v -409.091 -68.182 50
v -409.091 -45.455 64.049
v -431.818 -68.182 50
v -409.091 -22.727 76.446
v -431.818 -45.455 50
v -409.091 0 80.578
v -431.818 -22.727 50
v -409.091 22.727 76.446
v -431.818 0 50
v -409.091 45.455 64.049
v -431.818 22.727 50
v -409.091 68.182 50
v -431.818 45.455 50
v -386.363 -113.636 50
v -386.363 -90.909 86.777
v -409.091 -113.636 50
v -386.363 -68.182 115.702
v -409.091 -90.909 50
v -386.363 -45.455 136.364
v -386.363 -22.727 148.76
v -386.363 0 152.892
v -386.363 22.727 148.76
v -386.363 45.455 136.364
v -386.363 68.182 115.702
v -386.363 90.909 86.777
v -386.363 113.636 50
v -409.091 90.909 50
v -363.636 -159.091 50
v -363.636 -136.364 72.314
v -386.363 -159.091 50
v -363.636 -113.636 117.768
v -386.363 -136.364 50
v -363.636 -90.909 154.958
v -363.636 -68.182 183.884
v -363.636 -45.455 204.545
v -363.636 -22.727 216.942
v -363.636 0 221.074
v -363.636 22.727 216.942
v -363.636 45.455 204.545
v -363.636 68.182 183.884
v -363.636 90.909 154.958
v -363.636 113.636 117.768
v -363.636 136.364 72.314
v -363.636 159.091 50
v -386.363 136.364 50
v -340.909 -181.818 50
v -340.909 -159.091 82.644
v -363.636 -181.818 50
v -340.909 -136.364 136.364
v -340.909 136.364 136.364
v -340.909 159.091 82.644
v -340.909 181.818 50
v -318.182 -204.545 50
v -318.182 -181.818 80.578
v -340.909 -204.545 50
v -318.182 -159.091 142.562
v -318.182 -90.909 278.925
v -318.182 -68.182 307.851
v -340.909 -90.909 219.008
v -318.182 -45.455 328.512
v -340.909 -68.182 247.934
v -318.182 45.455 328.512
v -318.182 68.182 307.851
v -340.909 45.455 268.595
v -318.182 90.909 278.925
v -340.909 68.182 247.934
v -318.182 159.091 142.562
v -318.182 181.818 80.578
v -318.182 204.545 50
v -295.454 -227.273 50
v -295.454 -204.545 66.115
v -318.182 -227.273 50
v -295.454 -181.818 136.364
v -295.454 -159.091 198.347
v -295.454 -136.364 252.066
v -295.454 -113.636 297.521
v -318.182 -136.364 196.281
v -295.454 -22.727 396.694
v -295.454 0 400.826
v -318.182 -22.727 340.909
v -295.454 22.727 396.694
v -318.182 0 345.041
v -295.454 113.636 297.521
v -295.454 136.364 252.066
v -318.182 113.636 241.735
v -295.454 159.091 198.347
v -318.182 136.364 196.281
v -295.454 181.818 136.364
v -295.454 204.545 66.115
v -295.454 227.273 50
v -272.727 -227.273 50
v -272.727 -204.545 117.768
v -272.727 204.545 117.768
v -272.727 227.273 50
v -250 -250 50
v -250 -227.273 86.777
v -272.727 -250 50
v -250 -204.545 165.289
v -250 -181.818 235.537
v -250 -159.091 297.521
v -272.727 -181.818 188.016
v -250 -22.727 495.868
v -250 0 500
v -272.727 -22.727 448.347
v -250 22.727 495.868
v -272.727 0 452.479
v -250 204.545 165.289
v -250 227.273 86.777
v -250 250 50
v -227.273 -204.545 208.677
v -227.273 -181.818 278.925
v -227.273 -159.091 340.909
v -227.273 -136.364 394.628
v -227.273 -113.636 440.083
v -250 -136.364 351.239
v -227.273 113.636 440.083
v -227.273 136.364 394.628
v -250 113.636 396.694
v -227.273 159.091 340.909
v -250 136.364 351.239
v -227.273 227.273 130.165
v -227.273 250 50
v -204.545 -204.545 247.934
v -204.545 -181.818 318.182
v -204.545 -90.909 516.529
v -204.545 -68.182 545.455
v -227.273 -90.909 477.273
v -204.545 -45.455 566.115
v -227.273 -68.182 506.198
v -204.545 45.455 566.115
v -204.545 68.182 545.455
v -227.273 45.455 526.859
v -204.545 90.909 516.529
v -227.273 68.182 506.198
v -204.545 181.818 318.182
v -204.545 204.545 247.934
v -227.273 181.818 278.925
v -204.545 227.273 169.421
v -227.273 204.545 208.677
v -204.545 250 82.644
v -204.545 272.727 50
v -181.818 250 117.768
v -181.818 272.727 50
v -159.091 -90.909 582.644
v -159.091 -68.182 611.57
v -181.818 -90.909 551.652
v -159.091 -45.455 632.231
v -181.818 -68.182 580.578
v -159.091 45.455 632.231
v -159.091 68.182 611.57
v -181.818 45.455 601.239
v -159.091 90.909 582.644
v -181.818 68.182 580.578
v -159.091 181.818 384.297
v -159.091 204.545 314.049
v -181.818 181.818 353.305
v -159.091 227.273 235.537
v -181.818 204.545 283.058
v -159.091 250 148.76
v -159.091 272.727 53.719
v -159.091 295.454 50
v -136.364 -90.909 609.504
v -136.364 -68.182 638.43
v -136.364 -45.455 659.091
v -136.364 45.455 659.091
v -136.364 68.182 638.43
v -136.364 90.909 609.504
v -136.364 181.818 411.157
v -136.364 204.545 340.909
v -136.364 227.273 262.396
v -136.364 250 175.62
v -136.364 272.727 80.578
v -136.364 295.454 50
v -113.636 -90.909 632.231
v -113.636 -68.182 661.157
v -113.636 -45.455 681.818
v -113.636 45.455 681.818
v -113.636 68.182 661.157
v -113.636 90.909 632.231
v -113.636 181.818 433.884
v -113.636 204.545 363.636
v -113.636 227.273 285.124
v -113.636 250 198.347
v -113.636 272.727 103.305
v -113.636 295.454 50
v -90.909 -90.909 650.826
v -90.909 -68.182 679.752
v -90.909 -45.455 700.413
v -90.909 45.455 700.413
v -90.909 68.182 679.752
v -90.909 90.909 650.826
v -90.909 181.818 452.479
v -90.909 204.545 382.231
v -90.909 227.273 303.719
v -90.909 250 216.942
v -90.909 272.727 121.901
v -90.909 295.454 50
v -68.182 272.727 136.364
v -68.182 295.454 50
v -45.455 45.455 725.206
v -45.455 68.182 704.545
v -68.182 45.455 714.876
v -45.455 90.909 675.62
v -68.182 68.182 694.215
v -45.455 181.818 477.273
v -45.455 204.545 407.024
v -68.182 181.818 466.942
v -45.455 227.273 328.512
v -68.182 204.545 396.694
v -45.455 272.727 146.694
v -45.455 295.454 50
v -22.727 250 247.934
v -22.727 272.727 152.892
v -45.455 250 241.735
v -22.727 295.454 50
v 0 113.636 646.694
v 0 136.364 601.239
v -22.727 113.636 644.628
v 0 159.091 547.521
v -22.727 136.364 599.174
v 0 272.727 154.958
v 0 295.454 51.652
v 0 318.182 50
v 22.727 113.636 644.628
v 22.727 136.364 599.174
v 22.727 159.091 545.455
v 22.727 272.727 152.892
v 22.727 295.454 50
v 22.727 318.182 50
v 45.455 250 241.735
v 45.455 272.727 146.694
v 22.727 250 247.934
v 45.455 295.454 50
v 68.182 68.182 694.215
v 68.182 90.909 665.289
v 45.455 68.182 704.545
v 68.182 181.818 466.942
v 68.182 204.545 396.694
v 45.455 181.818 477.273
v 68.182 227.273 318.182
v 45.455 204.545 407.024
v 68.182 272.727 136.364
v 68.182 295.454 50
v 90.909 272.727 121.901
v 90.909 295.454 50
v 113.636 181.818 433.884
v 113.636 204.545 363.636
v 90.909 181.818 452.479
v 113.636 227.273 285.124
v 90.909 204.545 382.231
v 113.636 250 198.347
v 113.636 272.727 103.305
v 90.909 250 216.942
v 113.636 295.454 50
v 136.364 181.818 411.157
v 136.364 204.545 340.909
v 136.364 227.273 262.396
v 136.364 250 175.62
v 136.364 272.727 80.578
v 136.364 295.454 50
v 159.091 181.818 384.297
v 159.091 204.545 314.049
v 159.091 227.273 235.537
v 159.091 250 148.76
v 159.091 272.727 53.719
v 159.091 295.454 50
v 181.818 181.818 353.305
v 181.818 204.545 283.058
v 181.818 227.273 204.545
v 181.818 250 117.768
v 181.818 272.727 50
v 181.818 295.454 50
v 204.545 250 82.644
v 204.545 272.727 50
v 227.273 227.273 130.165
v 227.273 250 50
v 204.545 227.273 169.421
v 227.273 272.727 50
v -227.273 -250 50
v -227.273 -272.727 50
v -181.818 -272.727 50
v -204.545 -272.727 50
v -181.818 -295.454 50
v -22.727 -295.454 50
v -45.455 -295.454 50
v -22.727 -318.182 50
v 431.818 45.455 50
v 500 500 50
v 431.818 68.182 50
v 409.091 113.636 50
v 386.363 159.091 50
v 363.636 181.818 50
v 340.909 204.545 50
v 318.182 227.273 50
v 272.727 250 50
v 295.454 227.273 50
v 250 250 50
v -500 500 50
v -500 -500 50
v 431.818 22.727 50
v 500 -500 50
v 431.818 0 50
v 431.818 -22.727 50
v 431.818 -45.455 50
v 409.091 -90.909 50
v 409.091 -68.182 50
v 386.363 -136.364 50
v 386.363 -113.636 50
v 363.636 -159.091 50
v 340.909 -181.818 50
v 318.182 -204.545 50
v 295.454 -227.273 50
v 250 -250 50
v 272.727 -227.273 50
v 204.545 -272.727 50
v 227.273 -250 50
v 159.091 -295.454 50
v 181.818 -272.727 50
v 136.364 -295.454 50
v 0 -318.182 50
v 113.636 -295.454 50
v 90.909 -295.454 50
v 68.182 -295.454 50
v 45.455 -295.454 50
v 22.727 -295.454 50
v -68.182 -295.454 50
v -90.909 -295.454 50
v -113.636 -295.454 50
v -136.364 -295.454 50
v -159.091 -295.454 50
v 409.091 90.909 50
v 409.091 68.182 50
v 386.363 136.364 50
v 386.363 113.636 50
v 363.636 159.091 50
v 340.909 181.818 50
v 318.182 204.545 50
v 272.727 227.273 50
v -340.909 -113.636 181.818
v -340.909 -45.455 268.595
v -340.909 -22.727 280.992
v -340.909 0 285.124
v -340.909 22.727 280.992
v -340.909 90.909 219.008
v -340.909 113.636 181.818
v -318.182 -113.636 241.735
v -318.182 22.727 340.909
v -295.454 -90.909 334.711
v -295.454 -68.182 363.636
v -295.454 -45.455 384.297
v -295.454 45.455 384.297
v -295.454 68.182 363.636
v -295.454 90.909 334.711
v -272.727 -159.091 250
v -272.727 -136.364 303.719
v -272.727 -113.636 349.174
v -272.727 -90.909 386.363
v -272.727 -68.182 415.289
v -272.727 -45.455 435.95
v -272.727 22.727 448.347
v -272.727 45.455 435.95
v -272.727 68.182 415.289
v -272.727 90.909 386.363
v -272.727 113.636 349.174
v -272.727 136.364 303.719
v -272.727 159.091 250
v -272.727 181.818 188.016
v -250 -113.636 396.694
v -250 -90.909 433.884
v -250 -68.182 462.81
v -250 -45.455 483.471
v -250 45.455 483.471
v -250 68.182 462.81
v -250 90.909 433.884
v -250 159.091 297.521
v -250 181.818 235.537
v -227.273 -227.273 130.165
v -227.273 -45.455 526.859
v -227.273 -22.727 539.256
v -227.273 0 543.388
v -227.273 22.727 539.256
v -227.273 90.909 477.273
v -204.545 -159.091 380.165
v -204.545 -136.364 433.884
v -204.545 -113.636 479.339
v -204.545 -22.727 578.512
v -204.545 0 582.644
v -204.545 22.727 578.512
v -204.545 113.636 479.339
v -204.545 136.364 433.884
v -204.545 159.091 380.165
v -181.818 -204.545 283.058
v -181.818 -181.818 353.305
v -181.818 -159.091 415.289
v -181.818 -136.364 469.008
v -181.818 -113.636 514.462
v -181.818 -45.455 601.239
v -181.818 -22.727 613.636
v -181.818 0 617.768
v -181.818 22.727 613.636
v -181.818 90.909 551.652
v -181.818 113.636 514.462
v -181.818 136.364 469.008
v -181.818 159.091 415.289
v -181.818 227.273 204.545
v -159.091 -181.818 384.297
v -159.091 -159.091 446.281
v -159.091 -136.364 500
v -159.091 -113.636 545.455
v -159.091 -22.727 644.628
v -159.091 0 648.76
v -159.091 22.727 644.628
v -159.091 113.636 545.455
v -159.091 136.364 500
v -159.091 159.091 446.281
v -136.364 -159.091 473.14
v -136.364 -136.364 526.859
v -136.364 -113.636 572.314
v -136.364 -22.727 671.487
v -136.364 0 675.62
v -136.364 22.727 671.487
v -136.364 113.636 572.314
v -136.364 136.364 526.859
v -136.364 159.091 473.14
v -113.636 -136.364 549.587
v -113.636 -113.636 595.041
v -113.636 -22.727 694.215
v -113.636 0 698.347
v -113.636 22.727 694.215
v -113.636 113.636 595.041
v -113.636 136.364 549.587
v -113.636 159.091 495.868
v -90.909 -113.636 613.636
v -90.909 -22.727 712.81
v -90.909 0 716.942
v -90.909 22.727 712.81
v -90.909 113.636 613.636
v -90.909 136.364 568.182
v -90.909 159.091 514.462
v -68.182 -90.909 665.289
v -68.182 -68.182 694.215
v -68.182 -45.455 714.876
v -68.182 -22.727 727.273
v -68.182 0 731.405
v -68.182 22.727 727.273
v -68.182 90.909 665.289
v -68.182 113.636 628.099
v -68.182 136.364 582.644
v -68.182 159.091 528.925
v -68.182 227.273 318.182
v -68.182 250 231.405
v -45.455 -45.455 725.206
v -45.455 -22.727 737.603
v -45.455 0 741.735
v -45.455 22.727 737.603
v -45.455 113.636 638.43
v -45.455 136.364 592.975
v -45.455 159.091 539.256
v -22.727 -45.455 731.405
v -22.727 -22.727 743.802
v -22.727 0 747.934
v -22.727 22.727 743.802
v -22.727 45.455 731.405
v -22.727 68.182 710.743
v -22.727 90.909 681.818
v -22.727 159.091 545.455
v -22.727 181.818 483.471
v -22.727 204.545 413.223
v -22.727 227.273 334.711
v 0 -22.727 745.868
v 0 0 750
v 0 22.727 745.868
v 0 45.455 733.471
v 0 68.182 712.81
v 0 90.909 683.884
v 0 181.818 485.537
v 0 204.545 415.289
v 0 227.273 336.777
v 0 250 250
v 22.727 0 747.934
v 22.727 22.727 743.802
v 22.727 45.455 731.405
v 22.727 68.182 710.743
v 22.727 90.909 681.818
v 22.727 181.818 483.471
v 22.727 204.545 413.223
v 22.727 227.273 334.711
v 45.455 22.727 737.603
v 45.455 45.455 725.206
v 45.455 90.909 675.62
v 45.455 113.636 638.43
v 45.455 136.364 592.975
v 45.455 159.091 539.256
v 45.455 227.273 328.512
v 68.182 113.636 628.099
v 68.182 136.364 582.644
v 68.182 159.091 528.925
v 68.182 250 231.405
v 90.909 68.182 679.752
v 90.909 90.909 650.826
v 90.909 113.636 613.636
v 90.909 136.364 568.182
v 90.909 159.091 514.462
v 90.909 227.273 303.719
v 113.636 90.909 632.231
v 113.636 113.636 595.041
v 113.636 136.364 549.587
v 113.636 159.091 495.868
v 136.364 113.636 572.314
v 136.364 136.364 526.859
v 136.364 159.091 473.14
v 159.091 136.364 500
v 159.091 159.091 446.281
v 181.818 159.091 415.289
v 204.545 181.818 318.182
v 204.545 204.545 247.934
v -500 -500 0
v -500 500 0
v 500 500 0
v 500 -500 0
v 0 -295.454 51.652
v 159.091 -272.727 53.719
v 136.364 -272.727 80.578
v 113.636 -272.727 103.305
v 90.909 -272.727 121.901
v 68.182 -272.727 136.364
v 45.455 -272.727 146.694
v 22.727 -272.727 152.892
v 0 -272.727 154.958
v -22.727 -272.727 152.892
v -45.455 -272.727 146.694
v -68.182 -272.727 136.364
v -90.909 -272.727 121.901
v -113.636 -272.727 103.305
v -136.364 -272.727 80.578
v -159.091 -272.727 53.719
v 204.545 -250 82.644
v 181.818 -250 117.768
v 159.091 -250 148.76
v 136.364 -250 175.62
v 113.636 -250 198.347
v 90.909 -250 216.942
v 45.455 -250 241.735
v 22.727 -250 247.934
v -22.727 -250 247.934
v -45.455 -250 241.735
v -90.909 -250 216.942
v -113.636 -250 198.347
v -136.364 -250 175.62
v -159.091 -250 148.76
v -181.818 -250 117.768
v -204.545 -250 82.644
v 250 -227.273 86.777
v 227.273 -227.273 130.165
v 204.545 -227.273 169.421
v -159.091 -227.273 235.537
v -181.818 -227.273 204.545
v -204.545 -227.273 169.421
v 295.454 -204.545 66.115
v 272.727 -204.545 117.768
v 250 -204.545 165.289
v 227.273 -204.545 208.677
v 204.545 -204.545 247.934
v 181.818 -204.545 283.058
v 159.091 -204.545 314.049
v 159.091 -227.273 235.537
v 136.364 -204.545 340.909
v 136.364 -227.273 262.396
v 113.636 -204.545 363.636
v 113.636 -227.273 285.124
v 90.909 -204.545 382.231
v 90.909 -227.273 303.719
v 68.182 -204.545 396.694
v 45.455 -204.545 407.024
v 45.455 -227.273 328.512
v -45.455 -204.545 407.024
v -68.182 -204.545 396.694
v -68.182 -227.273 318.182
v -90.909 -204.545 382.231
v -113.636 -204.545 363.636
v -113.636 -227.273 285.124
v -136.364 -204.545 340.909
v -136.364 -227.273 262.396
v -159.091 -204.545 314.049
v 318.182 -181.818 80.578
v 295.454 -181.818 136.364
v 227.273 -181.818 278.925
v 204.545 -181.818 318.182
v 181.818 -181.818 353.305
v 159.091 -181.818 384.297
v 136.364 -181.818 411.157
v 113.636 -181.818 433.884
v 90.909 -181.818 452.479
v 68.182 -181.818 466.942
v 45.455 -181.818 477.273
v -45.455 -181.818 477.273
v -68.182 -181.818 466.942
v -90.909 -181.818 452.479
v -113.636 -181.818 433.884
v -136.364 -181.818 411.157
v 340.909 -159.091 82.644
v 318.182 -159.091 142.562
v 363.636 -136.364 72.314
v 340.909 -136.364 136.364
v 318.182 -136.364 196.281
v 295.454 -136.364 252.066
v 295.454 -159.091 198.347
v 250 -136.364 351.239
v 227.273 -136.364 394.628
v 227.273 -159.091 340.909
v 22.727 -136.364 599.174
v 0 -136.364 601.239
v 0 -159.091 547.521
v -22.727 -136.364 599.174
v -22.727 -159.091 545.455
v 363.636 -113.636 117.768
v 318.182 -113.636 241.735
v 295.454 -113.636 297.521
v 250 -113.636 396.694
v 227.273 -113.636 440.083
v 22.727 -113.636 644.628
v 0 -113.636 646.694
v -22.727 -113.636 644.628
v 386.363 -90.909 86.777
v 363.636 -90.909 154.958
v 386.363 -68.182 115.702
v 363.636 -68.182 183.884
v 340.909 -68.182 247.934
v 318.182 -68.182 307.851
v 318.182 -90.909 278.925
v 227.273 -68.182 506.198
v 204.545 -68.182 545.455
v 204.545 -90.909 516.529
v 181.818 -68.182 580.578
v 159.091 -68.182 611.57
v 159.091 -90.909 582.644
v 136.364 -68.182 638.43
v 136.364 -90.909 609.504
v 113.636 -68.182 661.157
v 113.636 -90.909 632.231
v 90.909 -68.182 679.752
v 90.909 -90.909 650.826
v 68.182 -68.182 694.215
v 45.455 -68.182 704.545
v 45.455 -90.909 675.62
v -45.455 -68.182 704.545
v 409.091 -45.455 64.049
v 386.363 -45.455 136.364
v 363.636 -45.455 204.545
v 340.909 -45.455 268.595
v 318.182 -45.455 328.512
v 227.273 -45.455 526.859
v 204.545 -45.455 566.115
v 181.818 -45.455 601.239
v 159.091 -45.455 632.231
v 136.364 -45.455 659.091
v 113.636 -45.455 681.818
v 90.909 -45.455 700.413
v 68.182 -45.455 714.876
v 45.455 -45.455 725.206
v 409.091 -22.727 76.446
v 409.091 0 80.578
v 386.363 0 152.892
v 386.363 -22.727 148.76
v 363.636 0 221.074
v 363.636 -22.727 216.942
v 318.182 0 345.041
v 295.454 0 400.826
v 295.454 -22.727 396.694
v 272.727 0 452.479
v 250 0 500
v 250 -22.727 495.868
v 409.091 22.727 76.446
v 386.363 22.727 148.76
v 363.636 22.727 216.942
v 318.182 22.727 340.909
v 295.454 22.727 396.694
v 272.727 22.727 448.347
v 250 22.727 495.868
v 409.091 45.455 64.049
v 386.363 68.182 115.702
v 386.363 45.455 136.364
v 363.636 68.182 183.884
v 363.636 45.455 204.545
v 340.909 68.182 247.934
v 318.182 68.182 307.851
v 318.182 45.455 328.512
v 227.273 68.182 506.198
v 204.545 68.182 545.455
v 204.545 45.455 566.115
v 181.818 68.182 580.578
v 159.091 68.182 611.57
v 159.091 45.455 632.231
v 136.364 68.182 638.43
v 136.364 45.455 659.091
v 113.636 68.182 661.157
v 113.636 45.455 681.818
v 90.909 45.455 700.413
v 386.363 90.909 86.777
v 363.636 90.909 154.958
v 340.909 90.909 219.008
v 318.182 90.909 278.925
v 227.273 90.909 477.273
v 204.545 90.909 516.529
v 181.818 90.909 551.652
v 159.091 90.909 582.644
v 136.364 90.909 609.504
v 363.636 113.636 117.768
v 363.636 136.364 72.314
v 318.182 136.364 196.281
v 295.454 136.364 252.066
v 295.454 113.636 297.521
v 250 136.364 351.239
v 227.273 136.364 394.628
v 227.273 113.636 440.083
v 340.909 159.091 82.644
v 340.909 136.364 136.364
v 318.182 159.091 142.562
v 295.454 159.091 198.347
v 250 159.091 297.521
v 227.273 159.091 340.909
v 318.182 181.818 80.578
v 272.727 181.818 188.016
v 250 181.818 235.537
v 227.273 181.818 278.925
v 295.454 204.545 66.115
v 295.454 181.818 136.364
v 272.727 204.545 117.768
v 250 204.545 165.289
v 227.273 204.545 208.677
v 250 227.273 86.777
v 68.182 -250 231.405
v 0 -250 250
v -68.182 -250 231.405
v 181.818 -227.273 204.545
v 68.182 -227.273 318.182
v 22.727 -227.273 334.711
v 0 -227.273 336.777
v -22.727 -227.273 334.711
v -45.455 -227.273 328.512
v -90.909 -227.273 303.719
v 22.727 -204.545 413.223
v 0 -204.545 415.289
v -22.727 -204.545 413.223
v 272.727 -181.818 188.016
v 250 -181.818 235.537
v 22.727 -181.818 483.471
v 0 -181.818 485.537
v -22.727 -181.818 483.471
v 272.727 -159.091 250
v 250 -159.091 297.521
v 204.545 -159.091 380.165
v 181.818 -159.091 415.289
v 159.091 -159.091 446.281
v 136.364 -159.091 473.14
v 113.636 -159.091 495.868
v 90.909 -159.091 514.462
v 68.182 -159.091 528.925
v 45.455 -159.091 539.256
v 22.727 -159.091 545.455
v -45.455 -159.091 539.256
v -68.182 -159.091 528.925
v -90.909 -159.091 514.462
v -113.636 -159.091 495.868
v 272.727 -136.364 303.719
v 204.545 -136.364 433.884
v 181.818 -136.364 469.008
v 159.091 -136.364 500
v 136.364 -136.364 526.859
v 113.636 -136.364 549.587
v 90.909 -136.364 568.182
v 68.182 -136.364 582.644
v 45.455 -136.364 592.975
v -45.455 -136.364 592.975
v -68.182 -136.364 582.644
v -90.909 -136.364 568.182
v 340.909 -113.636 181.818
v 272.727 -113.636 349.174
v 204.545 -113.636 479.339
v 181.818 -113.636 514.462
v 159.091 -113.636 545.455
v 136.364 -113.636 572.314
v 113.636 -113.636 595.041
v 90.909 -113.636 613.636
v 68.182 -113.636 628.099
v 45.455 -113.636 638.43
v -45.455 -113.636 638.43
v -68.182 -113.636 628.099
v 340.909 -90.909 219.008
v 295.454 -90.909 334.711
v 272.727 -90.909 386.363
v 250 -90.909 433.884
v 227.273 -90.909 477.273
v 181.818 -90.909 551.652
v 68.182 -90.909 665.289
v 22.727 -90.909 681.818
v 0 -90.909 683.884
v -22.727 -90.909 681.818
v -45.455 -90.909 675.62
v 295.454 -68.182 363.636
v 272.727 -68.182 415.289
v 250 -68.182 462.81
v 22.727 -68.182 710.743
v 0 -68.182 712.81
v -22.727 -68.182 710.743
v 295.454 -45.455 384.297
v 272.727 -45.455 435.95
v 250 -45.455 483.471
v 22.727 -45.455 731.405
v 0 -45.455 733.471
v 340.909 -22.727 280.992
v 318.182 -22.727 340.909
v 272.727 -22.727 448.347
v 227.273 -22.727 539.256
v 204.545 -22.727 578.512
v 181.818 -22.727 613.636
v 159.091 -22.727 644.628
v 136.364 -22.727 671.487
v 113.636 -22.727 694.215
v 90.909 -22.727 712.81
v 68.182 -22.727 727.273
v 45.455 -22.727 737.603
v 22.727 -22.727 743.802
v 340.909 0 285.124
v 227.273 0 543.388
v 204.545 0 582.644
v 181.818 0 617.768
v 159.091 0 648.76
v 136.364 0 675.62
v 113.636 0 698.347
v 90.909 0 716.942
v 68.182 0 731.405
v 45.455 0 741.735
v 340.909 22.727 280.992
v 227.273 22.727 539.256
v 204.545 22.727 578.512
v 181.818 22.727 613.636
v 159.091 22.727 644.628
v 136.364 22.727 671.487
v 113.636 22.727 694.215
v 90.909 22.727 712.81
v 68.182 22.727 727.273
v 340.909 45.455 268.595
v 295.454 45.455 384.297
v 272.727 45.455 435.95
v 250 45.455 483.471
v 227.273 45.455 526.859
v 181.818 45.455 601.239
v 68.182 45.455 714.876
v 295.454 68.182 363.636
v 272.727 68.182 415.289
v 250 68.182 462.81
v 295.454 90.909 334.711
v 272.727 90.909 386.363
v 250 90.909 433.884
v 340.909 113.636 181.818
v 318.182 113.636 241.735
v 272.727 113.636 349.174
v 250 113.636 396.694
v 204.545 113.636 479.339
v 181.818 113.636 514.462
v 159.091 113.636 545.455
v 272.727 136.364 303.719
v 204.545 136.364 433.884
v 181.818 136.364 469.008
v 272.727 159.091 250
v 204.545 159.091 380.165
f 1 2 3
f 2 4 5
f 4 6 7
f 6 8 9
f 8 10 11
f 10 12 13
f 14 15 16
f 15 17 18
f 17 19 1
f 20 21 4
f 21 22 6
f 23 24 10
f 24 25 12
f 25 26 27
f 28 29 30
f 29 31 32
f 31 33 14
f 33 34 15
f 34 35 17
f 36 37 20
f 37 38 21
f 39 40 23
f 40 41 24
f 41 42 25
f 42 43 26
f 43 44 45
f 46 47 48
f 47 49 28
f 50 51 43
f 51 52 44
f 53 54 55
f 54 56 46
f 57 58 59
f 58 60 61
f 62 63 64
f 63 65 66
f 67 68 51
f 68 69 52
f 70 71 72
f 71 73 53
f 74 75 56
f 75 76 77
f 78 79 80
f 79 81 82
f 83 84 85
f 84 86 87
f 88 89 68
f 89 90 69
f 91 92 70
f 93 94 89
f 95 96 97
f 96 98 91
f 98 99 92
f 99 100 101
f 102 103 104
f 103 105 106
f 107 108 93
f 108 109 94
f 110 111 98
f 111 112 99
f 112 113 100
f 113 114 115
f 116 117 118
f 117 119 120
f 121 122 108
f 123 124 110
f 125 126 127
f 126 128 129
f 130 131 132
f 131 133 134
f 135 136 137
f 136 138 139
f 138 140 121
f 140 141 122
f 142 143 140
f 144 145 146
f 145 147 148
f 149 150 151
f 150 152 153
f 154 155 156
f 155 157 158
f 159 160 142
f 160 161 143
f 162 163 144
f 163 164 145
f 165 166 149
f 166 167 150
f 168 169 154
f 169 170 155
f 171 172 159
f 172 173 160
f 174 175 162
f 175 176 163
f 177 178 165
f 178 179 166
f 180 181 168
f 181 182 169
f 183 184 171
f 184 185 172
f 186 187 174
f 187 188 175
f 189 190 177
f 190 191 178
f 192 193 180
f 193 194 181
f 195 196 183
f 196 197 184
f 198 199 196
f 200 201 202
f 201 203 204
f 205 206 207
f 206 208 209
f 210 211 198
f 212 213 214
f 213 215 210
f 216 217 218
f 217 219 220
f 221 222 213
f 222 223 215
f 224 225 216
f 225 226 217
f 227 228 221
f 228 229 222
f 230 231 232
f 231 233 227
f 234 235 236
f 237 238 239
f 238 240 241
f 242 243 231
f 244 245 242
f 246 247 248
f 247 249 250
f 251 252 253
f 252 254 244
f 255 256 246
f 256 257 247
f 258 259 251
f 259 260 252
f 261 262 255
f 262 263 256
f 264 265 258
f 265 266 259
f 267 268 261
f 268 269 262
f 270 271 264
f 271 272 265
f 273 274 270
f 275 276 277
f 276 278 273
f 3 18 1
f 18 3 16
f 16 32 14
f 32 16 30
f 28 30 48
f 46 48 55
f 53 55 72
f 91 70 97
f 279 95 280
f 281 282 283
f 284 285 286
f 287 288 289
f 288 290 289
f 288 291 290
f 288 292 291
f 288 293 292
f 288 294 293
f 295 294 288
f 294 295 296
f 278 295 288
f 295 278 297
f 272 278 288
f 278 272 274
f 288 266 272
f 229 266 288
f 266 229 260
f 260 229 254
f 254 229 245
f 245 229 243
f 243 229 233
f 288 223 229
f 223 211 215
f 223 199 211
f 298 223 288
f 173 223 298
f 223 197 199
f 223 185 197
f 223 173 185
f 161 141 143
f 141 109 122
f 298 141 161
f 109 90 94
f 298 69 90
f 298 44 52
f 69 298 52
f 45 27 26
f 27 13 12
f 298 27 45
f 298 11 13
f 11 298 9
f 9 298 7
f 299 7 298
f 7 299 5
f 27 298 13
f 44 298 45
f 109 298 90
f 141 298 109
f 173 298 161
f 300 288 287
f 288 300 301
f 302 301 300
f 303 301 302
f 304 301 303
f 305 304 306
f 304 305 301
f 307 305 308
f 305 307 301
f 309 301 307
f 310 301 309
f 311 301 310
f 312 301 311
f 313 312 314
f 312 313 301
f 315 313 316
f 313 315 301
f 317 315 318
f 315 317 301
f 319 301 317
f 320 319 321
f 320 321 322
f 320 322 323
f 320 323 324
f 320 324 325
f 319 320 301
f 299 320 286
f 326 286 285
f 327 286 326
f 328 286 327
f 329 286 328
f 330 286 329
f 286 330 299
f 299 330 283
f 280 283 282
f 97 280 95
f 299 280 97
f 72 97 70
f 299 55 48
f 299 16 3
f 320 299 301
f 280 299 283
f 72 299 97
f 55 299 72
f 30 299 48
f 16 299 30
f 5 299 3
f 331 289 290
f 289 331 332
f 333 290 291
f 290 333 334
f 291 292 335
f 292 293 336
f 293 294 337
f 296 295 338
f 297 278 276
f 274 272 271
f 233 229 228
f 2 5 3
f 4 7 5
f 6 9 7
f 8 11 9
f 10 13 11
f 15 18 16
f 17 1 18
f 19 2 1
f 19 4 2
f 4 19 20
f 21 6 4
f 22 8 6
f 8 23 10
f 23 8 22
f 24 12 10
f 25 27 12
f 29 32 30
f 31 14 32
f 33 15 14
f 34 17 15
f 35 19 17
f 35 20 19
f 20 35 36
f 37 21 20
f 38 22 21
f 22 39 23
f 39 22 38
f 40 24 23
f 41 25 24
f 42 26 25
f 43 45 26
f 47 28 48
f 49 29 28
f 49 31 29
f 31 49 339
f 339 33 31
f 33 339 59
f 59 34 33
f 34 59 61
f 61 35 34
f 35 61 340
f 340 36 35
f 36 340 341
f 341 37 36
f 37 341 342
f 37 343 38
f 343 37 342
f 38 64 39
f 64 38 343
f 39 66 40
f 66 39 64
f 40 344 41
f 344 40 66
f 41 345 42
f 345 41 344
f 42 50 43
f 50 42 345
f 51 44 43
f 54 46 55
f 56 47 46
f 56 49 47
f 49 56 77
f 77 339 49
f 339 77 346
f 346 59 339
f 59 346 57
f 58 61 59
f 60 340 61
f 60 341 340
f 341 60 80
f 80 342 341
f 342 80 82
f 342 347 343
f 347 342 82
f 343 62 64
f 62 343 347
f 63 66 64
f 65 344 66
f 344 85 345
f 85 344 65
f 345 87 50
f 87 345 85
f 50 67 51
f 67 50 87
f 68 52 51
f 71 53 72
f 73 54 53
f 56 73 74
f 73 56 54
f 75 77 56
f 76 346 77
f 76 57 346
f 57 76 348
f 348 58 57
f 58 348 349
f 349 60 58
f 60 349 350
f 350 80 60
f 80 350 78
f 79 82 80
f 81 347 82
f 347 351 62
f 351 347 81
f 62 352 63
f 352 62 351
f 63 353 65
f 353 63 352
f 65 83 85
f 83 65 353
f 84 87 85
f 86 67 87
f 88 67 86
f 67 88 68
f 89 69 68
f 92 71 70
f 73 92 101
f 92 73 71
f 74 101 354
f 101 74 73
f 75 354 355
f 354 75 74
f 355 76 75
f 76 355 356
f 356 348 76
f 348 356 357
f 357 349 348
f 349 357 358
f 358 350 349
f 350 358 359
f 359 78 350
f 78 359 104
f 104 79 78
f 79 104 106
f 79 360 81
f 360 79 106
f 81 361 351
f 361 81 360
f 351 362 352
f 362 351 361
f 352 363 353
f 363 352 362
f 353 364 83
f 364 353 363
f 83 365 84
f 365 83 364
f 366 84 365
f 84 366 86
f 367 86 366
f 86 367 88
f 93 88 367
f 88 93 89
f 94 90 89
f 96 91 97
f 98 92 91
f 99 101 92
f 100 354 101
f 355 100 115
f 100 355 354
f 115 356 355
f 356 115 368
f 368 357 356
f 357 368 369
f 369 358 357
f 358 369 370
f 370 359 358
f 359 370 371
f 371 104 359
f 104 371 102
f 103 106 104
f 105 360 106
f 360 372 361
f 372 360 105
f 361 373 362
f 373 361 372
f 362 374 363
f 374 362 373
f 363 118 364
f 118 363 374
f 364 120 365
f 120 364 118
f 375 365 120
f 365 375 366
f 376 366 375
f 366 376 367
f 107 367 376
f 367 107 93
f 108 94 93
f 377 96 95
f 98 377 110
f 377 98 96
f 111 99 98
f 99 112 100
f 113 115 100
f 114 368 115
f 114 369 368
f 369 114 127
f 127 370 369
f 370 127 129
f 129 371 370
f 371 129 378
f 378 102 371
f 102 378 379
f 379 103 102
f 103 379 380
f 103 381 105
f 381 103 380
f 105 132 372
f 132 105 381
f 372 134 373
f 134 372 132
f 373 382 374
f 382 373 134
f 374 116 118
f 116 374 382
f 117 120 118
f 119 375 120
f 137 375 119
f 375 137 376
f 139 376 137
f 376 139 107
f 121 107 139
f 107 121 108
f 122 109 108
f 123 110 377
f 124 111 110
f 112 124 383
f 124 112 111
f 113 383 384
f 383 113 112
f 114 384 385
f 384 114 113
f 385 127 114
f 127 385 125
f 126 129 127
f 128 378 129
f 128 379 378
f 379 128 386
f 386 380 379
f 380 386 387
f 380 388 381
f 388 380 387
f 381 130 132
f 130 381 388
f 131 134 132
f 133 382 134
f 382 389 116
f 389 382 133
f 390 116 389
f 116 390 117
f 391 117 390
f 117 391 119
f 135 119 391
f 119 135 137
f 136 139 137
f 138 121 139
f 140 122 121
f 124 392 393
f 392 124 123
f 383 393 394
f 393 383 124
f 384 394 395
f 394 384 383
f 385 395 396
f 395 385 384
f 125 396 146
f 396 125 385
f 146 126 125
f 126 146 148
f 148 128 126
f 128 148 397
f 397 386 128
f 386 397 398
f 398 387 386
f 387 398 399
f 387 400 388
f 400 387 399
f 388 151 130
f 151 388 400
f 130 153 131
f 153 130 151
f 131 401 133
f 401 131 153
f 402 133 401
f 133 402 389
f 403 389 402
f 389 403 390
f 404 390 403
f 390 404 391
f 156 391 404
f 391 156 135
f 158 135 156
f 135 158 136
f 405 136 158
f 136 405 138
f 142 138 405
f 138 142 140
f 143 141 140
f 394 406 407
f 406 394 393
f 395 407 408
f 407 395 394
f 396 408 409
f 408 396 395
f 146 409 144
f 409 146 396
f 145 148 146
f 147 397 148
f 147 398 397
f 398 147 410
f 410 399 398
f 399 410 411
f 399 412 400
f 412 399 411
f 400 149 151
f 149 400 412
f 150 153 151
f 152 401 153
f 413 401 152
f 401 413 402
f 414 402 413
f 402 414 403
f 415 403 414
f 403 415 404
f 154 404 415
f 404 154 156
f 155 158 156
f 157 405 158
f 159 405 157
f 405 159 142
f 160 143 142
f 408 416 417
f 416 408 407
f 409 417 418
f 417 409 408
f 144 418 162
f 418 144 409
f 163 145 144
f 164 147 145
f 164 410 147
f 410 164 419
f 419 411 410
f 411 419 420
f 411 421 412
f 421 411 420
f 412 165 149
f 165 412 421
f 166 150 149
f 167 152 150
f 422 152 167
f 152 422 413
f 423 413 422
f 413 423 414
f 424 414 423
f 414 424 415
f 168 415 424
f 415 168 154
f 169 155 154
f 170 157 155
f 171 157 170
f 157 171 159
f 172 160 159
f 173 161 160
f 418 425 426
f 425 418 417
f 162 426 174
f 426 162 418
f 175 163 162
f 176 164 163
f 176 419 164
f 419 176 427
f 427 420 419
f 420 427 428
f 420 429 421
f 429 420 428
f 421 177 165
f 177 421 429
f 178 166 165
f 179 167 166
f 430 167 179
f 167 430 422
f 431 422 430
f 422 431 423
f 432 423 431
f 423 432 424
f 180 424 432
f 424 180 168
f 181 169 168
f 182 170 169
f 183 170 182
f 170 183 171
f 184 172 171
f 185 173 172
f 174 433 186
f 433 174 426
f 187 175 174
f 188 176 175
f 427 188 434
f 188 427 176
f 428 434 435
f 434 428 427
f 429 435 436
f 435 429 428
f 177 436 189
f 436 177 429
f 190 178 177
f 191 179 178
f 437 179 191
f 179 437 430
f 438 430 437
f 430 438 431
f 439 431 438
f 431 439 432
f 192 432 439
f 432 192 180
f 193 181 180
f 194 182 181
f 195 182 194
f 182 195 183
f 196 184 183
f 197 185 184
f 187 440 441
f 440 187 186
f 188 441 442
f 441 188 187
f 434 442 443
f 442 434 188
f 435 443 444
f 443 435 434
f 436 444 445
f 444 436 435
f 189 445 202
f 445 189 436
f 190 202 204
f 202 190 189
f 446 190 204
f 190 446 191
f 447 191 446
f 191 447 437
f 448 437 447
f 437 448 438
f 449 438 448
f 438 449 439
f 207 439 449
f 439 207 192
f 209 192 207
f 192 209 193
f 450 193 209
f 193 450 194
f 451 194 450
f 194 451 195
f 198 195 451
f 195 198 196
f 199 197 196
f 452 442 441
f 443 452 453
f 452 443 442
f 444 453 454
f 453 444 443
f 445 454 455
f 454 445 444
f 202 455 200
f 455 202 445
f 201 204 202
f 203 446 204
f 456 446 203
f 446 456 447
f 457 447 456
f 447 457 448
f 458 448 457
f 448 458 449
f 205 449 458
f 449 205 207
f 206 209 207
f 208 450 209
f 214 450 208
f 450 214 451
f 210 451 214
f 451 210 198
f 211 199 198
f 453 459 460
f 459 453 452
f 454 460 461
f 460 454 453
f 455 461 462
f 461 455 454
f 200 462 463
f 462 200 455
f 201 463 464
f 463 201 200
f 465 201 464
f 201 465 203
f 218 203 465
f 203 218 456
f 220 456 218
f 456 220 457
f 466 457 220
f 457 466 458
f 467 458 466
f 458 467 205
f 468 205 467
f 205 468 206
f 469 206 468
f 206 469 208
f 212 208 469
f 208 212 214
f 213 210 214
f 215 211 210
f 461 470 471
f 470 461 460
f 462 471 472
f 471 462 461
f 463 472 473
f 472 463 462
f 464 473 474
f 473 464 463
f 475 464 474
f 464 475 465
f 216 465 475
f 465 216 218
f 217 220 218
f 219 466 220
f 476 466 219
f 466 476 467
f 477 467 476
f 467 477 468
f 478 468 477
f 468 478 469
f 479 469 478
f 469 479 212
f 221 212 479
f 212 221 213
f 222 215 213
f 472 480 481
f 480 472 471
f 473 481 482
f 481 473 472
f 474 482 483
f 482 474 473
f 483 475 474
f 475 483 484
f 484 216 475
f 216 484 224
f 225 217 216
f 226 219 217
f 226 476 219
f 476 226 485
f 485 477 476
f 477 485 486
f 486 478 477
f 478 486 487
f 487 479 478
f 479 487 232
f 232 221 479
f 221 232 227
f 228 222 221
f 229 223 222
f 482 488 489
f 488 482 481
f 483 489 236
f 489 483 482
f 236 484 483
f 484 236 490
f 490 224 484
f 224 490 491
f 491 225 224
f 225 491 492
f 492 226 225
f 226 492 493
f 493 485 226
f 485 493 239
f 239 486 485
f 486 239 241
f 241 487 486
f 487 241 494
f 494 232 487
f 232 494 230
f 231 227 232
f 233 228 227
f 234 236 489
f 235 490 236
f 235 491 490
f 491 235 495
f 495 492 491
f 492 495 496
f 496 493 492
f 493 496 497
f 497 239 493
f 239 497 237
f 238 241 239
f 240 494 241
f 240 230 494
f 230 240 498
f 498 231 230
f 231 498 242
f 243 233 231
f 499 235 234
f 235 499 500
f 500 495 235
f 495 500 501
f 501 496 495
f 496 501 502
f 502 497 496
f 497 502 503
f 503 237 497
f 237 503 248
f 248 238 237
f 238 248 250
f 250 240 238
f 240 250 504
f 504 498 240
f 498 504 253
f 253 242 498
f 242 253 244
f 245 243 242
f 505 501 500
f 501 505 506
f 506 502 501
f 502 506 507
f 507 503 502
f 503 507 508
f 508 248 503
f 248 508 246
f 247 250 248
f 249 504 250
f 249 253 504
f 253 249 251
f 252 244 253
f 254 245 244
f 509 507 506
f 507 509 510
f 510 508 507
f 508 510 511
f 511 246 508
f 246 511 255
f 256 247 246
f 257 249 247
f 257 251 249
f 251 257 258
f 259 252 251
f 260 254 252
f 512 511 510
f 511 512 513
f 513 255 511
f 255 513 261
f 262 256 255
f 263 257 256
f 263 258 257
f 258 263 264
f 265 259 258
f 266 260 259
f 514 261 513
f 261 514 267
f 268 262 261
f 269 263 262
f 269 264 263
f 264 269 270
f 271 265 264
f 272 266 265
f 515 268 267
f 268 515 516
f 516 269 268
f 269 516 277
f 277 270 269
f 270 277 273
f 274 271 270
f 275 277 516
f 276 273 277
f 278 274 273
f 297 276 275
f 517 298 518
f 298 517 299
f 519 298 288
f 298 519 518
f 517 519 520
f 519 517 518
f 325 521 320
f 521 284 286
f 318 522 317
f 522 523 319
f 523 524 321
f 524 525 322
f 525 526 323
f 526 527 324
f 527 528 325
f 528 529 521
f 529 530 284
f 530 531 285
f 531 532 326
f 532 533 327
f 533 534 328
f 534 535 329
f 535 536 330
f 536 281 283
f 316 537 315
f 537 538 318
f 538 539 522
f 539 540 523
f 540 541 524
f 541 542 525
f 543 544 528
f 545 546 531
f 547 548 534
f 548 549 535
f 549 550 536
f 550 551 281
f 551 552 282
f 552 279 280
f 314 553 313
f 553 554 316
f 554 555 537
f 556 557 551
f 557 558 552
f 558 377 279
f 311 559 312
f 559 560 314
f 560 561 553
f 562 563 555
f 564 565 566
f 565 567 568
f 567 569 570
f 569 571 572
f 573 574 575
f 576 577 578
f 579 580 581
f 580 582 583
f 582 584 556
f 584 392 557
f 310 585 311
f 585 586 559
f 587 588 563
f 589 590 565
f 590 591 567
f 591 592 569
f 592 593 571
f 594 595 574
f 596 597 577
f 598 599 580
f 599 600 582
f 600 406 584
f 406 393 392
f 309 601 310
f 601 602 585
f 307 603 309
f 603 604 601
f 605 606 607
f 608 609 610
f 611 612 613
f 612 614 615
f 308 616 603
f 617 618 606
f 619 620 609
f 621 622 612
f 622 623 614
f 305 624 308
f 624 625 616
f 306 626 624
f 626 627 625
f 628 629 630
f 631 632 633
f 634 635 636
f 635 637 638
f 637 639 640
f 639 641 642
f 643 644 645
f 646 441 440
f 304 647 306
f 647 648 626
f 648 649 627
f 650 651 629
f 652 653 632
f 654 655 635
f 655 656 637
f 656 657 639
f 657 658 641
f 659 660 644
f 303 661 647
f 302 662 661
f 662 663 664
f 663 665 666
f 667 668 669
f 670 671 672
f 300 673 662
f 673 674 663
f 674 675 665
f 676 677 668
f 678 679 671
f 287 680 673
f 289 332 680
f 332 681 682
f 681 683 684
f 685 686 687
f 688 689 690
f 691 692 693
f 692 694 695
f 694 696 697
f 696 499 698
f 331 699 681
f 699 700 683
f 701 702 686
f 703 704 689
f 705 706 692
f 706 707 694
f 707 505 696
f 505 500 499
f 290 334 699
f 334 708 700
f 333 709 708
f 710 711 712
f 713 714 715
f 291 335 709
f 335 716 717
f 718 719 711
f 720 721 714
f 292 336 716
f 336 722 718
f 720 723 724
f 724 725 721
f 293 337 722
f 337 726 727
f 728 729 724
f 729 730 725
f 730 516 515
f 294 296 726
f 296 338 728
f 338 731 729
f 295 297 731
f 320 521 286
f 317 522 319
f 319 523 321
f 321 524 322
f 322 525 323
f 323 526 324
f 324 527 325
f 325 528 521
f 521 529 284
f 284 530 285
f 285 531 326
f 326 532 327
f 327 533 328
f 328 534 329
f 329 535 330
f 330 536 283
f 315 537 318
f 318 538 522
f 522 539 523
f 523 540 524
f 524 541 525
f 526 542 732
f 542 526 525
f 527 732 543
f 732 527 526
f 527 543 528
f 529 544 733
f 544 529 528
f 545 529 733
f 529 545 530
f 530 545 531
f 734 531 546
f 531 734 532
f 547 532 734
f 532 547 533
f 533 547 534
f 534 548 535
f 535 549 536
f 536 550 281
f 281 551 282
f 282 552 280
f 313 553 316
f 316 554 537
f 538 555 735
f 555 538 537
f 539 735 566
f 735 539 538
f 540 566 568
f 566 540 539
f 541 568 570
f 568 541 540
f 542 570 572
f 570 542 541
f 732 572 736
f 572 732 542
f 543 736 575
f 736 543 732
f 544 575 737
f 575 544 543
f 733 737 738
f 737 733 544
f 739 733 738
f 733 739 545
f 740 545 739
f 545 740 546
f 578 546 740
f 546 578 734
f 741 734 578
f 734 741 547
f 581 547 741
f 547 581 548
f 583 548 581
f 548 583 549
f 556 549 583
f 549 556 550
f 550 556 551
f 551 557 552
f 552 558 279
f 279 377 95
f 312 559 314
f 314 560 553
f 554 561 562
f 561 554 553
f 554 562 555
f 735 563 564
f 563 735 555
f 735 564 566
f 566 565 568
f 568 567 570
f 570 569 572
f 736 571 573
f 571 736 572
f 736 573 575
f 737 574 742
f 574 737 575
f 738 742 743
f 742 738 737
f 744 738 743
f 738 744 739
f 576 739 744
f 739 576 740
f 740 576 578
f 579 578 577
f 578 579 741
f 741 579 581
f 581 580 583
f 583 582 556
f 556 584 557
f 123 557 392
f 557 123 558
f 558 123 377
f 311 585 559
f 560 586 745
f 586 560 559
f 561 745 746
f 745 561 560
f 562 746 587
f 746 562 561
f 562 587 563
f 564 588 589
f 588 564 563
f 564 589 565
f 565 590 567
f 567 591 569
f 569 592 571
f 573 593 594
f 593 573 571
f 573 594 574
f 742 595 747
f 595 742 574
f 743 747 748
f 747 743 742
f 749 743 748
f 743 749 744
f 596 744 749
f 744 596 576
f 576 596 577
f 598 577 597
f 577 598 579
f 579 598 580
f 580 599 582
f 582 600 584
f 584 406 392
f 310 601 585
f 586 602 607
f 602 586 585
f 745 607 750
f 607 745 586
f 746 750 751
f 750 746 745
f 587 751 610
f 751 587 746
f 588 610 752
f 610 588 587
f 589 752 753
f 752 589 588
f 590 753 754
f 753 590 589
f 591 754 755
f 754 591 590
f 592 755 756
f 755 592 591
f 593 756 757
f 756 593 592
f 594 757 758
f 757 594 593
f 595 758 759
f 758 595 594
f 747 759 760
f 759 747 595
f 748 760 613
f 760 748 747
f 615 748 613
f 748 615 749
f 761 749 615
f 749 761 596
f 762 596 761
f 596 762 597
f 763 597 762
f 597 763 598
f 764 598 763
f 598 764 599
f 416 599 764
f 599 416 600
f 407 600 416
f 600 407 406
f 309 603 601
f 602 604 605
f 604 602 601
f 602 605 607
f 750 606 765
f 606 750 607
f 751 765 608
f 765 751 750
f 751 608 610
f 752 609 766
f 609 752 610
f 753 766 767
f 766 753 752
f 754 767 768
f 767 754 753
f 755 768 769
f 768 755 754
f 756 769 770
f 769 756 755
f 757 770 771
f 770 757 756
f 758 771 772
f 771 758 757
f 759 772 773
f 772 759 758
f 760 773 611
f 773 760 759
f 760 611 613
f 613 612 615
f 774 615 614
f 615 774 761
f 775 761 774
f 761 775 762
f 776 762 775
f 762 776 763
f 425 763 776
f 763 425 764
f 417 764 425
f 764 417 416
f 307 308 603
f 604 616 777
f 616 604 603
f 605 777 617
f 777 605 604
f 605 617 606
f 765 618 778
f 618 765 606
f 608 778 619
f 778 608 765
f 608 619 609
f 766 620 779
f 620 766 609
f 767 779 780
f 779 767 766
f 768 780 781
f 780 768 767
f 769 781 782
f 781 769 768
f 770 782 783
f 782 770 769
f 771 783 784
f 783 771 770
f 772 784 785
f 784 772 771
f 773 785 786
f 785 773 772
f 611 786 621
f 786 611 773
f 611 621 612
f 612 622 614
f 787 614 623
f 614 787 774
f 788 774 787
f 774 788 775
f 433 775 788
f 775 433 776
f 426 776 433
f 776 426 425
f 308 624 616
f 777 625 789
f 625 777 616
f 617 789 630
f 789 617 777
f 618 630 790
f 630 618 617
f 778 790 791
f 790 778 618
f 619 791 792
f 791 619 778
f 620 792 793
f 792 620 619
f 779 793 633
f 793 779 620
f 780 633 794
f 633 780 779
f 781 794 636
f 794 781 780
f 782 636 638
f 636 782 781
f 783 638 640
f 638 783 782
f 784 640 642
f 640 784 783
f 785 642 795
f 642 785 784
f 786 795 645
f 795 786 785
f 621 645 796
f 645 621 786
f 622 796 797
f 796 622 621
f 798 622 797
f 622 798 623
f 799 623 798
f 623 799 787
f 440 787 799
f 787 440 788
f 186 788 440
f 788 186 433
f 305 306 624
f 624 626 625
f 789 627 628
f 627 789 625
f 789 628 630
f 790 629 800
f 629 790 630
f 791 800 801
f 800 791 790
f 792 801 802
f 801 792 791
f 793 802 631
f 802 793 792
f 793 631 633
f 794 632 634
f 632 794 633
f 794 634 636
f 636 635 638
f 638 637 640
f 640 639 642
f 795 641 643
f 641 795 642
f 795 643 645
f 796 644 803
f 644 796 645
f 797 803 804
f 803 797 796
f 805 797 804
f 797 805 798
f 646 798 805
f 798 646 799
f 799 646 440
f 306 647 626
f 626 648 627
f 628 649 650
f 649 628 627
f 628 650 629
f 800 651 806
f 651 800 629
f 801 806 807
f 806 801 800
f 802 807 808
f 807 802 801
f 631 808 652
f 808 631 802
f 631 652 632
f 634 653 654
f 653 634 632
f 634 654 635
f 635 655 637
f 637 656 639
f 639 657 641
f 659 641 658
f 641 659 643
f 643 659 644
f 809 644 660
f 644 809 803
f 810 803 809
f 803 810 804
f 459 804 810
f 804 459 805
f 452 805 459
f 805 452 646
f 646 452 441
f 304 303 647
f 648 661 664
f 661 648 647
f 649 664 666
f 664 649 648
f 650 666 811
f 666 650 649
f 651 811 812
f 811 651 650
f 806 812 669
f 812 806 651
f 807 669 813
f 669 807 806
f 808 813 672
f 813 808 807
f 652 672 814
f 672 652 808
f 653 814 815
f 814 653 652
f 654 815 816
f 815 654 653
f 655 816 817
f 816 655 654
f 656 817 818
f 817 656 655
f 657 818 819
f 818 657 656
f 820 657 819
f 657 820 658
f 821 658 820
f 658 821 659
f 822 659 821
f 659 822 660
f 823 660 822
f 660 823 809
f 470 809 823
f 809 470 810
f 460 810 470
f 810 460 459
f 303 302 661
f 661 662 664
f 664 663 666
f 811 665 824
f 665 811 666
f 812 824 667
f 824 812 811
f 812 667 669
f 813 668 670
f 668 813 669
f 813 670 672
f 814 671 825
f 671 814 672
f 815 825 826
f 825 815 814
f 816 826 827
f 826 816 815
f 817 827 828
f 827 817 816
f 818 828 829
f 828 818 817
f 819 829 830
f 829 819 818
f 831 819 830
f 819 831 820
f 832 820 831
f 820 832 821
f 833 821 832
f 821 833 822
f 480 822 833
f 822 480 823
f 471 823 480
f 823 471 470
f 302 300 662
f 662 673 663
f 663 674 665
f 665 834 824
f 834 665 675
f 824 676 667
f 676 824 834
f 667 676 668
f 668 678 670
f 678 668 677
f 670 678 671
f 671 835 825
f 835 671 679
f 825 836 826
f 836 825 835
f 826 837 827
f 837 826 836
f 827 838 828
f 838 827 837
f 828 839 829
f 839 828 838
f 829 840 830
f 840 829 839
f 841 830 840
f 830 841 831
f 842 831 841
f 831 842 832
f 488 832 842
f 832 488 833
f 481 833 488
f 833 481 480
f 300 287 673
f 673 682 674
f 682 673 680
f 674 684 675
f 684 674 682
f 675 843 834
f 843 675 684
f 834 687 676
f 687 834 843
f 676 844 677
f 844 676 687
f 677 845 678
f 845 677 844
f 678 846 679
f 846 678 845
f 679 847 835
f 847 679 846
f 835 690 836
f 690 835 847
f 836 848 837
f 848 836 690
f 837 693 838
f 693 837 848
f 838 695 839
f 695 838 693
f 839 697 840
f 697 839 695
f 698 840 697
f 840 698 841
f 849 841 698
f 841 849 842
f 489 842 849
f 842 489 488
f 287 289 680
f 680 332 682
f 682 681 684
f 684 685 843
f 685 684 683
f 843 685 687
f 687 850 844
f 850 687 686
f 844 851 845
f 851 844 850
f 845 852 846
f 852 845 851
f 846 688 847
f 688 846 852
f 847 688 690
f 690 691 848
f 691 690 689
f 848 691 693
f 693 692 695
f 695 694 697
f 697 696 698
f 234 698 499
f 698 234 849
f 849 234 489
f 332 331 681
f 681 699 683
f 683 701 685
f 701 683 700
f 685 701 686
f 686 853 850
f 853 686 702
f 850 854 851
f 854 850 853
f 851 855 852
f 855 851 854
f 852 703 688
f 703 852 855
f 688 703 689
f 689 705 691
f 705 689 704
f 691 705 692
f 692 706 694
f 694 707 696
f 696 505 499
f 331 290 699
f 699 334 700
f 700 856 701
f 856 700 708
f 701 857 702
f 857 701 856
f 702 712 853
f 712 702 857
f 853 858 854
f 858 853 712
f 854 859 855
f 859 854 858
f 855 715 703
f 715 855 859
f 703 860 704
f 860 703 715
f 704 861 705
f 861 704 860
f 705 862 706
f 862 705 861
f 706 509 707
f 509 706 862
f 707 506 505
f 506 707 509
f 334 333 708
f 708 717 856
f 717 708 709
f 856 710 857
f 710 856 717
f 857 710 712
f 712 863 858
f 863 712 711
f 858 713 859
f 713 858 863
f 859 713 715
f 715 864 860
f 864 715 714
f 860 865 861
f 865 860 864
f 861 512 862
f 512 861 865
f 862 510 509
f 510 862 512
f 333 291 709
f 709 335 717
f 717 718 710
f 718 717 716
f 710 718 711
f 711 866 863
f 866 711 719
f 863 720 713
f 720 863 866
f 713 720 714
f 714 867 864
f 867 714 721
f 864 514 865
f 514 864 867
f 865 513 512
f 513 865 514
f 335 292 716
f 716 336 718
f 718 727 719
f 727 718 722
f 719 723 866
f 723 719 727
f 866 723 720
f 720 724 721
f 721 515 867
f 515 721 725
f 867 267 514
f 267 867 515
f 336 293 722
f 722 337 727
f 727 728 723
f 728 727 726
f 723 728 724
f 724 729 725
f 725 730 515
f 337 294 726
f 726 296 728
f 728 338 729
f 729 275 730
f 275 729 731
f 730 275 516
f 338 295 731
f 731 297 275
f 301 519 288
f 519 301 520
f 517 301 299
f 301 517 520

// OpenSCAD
///////////////////////////////////////////////////////////////////
//
// plot
// ====
//
// This module draws a polyhedron mapping a function greater than zero.
// The domain of the function may be either a triangle or a quadrilateral.
// The function is evaluated in a triangular grid of points inside its domain 
// and its graph is ploted. 
//
//    module plot(m,p0,p1,p2,p3=undef,conv=10)
//
// where the parameters are:
//
//    m         - the approximate number of points in the grid for each
//                triangular domain; quadrilaterals will have 2*m points
//    p0,p1,p2  - the three 2D points of the triangular domain
//    p3        - the third point of a second triangular domain (p0,p2,p3);
//                if p3 is undef, just the first triangular domain is used
//    conv      - convexity parameter of the polihedra
//
// The module requires an external function to be plotted:
//
//    function map_to_plot(x,y)
//
// which should return either a real value or undef for each real x and y. 
//
////////////////////////////////////////////////////////////////////

module plot(m, p0, p1, p2, p3=undef, conv=10){
  
  N = ceil( sqrt( 2 * m) - 3/2 );
  
  // the main task
  union(){
    plot_tri(p0, p1, p2);
    if (p3 != undef)
      plot_tri(p0, p2, p3);
  }
  
 // module to plot in a triangular domain
  module plot_tri(p0, p1, p2) {
    
    // the three domain points should be in anti-clockwise order
    A =  p0;
    B = (p1-p0) * (p2-p0) < 0 ? p2 : p1;
    C = (B==p1) ? p2 : p1;
    
    // the indexed points in the grid
    function meshPoint(i,j) = A*i/N + B*j/N + C*(N-i-j)/N;

    // functions to enumerate the points with defined values of the map_to_plot
    function shrinked(a) = 
      [for (i=[0:N], j=[0:N-i]) if(a[i][j][2] != undef) a[i][j] ];
        
    function enum(a) = let(b = shrinked(a))
      [for (i=[0:N]) 
        [ for (j=[0:N-i])
          (a[i][j][2] != undef)? 
            [for ( k = search(a[i][j], b, 0)[0]) if (a[i][j] == b[k]) k ][0]:
            undef
      ]];
  
     // the vertices in the grid
    map = [ for (i=[0:N])
          [ for (j=[0:N-i])
            let(x = meshPoint(i,j)[0], y = meshPoint(i,j)[1])
              [ x, y, map_to_plot(x,y)] 
          ]];

    emap = enum(map);
          
    // the points in the top of the plot
    toppts = [ for(i=[0:N], j=[0:N-i])  if(emap[i][j] != undef) map[i][j] ];

    // the points in the base of the plot
    botpts = [ for (pts = toppts)[ pts[0], pts[1], 0 ] ];
      
    // the faces in the top of the plot
    top_tri_faces = 
      concat( 
        [for(i=[1:N], j=[0:N-i]) 
          if( (emap[i][j]   !=undef) && 
              (emap[i-1][j] !=undef) && 
              (emap[i][j-1] !=undef) ) 
                [ emap[i][j], emap[i][j-1], emap[i-1][j] ]],

        [for(i=[0:N-1], j=[0:N-i]) 
          if( (emap[i][j]     !=undef) && 
              (emap[i][j-1]   !=undef) && 
              (emap[i+1][j-1] !=undef)) 
                [ emap[i][j], emap[i+1][j-1], emap[i][j-1] ]] 
       );
          
    // the faces in the base of the plot
    base_tri_faces = let(k = len(toppts))
        [ for(face = top_tri_faces) [ face[1]+k, face[0]+k, face[2]+k ] ];

    // enumeration of the vertices of vertical quadrilateral faces of the plot
    // faces with constant j :   10 00 1-1 01 
    function side_faces1(a) = let (k = len(toppts))
        [for(i=[0:N-1], j=[0:N-i])
          let (p = (a[ i ][ j ] != undef) && (a[i+1][ j ] != undef),
               q = (a[i+1][j-1] == undef) && (a[ i ][j+1] != undef),
               r = (a[i+1][j-1] != undef) && (a[ i ][j+1] == undef) )
          if ( p  && ( q || r ) ) q ?
            [ a[ i ][j], a[i+1][j], a[i+1][j]+k, a[ i ][j]+k ] :
            [ a[i+1][j], a[ i ][j], a[ i ][j]+k, a[i+1][j]+k ]
        ];

    // faces with constant i :  00 01  10  -11
    function side_faces2(a) = let (k = len(toppts))
        [for(i=[0:N-1], j=[0:N-i])
          let (p = (a[ i ][j] != undef) && (a[ i ][j+1] != undef),
               q = (a[i+1][j] == undef) && (a[i-1][j+1] != undef),
               r = (a[i+1][j] != undef) && (a[i-1][j+1] == undef) )
          if ( p  && ( q || r ) ) q ?
            [ a[i][ j ], a[i][j+1], a[i][j+1]+k, a[i][ j ]+k ]:
            [ a[i][j+1], a[i][ j ], a[i][ j ]+k, a[i][j+1]+k ]
        ];

    // faces with constant N-i-j :   00  1-1  10 0-1 
    function side_faces3(a) = let (k = len(toppts))
        [for(i=[0:N-1], j=[0:N-i])
          let (p = (a[ i ][j] != undef) && (a[i+1][j-1] != undef),
               q = (a[i+1][j] == undef) && (a[ i ][j-1] != undef),
               r = (a[i+1][j] != undef) && (a[ i ][j-1] == undef) )
          if ( p  && ( q || r ) ) q ?
            [ a[i+1][j-1], a[ i ][ j ], a[ i ][ j ]+k, a[i+1][j-1]+k ]:
            [ a[ i ][ j ], a[i+1][j-1], a[i+1][j-1]+k, a[ i ][ j ]+k ]
         ];

    side_faces = 
          concat( side_faces1(emap), side_faces2(emap), side_faces3(emap));
                 
    polyhedron(
        points = concat(toppts, botpts),
        faces  = concat(top_tri_faces, side_faces, base_tri_faces),
        convexity = conv);
  }
}

// examples of usage
// function map_to_plot(x,y) = abs(x*x+y*y+3*x)<170? 0.1*(-x*x + y*y)+20: undef;
// plot(1000,[10,0], [-10,10], [-10,-10], [10,-20]);
//
// function map_to_plot(x,y) = 20+12*exp(-0.006*abs(x*x+y*y))*cos(1.5*(x*x+y*y));



// XXX Define your stuff here XXX
function f(x,y) =  1.5-(2*x*x+4*y*y); //1.5-2*sqrt(x*x+y*y);
size_of_base_in_milimeters = 1000;
resolution = 1000; //higher numbers produce a better result




function map_to_plot(x,y) = f(x,y) > .1 ? f(x,y) : .1;
scale([size_of_base_in_milimeters/2,size_of_base_in_milimeters/2,size_of_base_in_milimeters/2]) plot(resolution, [1,1], [-1,1], [-1,-1], [1,-1]);
 //plot(750,[20,0], [20,40], [-20,20]);
//
// function map_to_plot(x,y) = 10 + 0.005*(x*x*y - 3*x*y)+ ((rands(0,2,1)[0]<0.7)? rands(0,0.02*y,1)[0]: 0);
// plot(700, [10,-10], [10,10], [-10,10], [-10,-10]);
 
